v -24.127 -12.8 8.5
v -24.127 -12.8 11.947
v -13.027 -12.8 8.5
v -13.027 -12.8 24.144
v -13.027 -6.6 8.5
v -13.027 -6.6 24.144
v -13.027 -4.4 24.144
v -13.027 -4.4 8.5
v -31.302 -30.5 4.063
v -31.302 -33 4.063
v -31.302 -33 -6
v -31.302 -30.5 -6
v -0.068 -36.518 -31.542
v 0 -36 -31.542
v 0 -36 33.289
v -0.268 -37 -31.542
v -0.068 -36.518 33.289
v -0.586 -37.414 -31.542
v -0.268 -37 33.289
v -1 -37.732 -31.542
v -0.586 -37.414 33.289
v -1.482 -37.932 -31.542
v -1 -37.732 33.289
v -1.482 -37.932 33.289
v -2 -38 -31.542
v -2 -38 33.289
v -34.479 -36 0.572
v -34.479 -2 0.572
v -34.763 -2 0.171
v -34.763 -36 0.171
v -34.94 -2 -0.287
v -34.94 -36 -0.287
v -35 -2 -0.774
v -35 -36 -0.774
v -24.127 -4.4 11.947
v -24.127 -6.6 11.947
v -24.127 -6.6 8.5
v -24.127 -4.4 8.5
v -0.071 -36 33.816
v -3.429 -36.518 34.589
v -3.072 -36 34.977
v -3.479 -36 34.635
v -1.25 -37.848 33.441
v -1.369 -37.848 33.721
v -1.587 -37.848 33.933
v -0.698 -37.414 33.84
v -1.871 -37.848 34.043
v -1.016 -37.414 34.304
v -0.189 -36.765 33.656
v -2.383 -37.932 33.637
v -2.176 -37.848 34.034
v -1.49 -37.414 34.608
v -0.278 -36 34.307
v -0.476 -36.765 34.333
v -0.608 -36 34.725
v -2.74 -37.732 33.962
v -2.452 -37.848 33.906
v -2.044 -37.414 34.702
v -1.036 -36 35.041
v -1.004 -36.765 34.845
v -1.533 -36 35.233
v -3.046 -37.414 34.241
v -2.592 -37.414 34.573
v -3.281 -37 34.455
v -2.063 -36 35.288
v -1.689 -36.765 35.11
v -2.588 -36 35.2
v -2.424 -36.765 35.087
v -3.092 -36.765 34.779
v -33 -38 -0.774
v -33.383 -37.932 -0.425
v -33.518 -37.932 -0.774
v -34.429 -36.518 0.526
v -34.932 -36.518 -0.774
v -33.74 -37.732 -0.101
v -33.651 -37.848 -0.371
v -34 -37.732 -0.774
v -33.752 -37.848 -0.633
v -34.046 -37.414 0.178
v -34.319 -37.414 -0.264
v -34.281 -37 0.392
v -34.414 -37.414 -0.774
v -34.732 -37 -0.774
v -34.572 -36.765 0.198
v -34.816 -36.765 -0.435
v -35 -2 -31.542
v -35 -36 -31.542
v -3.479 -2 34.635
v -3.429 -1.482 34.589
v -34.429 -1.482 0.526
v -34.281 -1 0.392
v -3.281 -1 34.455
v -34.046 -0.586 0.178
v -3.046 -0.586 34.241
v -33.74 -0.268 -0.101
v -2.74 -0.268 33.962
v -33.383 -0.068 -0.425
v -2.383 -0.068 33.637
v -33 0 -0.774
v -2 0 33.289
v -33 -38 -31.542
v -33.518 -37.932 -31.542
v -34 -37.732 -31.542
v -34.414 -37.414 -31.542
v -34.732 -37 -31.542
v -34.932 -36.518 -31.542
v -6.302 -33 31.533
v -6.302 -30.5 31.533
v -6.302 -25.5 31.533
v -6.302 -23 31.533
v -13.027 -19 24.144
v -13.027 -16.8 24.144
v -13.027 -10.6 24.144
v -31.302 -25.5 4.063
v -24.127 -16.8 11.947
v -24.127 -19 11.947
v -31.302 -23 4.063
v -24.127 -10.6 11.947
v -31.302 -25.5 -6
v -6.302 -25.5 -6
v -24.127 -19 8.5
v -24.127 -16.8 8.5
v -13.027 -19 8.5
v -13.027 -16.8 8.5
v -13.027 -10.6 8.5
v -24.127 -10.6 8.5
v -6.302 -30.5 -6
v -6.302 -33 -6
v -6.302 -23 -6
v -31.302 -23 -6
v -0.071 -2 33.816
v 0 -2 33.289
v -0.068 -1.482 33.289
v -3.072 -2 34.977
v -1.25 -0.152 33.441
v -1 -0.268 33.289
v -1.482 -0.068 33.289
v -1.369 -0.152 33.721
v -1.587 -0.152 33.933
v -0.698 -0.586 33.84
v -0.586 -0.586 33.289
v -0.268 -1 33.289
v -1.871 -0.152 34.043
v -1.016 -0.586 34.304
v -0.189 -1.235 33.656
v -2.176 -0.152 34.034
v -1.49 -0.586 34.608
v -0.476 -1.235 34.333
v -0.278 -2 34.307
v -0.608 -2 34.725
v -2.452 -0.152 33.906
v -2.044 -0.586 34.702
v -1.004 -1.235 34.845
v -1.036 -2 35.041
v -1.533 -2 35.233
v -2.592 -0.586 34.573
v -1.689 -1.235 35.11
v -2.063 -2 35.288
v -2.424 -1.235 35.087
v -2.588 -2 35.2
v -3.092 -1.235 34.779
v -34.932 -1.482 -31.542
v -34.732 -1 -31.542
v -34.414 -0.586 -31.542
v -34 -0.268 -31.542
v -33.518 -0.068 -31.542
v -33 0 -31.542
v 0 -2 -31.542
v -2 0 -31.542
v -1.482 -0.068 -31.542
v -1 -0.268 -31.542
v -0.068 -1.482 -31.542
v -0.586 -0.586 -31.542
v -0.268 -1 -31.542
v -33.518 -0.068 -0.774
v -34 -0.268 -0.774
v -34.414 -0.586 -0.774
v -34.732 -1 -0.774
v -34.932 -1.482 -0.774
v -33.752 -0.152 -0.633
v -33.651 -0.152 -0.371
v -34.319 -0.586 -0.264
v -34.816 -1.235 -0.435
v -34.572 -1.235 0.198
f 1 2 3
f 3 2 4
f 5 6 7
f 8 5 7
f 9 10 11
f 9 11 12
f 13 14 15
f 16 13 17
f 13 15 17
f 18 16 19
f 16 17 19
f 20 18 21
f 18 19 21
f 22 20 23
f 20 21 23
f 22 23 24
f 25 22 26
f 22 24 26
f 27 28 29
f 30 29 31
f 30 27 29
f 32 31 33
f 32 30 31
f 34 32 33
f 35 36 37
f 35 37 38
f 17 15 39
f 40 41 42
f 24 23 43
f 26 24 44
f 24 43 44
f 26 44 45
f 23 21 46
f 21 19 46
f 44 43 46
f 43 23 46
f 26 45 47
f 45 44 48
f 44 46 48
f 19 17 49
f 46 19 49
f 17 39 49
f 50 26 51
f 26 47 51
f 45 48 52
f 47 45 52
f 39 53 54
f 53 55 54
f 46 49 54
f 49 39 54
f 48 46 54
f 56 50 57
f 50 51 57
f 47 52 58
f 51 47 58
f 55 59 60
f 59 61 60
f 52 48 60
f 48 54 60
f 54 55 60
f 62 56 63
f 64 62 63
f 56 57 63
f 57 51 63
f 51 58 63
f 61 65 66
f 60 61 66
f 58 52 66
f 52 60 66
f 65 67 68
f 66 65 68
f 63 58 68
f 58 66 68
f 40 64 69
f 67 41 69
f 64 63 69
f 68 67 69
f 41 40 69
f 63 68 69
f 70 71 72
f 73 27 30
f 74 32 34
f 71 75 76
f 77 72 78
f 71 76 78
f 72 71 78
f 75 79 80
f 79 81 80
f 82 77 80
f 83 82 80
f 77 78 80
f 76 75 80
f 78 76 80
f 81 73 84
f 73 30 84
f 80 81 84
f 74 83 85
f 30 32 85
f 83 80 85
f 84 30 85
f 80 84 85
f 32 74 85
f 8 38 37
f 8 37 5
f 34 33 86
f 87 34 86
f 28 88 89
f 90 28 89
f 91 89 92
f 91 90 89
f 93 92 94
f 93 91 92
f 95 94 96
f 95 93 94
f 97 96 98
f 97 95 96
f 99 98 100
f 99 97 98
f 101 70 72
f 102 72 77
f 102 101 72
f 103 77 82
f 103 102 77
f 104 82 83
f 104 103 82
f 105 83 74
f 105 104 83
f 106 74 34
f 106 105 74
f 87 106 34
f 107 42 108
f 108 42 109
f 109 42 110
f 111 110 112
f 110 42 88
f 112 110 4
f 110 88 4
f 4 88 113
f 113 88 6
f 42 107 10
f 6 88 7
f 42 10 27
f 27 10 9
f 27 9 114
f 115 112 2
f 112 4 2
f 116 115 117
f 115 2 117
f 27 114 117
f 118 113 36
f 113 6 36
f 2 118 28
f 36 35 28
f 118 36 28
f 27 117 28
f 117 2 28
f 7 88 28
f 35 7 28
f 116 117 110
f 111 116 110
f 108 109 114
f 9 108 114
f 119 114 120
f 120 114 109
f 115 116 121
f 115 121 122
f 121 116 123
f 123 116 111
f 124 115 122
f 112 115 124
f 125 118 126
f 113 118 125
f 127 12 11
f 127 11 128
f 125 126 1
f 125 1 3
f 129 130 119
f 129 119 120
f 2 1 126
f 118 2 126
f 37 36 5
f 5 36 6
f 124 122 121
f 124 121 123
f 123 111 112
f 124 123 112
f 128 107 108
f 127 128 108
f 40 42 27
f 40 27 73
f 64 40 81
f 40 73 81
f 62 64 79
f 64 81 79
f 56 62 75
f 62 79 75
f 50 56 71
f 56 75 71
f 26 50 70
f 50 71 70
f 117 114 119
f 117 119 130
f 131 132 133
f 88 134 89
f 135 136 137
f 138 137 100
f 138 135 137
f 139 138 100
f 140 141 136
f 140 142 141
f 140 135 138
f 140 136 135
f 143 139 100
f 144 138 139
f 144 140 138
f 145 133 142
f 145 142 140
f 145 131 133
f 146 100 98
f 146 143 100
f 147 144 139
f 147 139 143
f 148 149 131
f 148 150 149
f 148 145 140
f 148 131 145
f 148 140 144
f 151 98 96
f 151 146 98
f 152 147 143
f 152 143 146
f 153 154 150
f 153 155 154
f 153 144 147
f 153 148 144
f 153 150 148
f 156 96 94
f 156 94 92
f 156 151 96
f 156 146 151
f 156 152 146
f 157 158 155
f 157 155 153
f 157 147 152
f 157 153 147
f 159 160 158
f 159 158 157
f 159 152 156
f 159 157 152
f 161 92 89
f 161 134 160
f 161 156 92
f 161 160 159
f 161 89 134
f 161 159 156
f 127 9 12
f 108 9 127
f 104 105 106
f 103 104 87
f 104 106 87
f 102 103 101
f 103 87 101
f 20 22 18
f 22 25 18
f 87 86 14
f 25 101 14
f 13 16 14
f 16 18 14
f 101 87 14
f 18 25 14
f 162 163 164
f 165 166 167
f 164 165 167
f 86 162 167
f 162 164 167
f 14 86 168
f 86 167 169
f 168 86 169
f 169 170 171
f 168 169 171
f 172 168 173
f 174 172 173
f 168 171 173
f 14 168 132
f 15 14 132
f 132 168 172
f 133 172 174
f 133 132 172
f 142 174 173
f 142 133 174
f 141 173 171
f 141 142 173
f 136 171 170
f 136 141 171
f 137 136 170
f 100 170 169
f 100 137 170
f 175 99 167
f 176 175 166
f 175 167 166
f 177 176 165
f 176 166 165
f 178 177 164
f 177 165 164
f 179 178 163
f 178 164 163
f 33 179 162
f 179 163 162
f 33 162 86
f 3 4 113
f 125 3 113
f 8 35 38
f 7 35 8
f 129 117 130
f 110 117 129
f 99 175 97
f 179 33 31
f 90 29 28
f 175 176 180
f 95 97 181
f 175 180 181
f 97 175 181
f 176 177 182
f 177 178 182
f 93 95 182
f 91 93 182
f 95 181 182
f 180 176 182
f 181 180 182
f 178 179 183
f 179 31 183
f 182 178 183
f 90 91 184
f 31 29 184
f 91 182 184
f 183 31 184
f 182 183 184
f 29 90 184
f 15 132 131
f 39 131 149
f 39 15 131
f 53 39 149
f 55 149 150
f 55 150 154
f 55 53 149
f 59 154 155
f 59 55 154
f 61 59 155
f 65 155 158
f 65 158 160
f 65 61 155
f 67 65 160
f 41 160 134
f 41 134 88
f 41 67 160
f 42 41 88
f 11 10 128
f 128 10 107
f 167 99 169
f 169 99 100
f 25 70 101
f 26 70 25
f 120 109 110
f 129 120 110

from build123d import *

# Parameters (mm, degrees)
F1_DEPTH = 38
F3_W     = 25
F3_H     = 2.5
F4_DEPTH = 45
F3_W_2   = 11.1
F3_H_2   = 2.2
F5_DEPTH = 30.5
F6_R     = 2


with BuildPart() as f1:
    # F0 (on Front) → F1 (new body)
    with BuildSketch(Plane.XZ):
        Polygon((0, -31.542231), (0, 38.457769), (-35, 0), (-35, -31.542231), align=None)
    extrude(amount=F1_DEPTH)

    # F3 (on offset) → F4 (cut)
    with BuildSketch(Plane.XY.offset(39)):
        with Locations((-18.802461, -31.75)):
            Rectangle(F3_W, F3_H)
        with Locations((-18.802461, -24.25)):
            Rectangle(F3_W, F3_H)
    extrude(amount=-F4_DEPTH, mode=Mode.SUBTRACT)

    # F3 (on offset) → F5 (cut)
    with BuildSketch(Plane.XY.offset(39)):
        with Locations((-18.576984, -11.7)):
            Rectangle(F3_W_2, F3_H_2)
        with Locations((-18.576984, -17.9)):
            Rectangle(F3_W_2, F3_H_2)
        with Locations((-18.576984, -5.5)):
            Rectangle(F3_W_2, F3_H_2)
    extrude(amount=-F5_DEPTH, mode=Mode.SUBTRACT)

    # F6
    f6_edges = [f1.edges().sort_by_distance(p)[0] for p in [
        (-17.5, 0, 19.228885),
        (-35, -19, 0),
        (-17.5, -38, 19.228885),
        (0, -19, 38.457769),
        (0, 0, 3.457769),
        (0, -38, 3.457769),
        (-35, 0, -15.771115),
        (-35, -38, -15.771115),
    ]]
    fillet(f6_edges, radius=F6_R)


solid = f1.part
